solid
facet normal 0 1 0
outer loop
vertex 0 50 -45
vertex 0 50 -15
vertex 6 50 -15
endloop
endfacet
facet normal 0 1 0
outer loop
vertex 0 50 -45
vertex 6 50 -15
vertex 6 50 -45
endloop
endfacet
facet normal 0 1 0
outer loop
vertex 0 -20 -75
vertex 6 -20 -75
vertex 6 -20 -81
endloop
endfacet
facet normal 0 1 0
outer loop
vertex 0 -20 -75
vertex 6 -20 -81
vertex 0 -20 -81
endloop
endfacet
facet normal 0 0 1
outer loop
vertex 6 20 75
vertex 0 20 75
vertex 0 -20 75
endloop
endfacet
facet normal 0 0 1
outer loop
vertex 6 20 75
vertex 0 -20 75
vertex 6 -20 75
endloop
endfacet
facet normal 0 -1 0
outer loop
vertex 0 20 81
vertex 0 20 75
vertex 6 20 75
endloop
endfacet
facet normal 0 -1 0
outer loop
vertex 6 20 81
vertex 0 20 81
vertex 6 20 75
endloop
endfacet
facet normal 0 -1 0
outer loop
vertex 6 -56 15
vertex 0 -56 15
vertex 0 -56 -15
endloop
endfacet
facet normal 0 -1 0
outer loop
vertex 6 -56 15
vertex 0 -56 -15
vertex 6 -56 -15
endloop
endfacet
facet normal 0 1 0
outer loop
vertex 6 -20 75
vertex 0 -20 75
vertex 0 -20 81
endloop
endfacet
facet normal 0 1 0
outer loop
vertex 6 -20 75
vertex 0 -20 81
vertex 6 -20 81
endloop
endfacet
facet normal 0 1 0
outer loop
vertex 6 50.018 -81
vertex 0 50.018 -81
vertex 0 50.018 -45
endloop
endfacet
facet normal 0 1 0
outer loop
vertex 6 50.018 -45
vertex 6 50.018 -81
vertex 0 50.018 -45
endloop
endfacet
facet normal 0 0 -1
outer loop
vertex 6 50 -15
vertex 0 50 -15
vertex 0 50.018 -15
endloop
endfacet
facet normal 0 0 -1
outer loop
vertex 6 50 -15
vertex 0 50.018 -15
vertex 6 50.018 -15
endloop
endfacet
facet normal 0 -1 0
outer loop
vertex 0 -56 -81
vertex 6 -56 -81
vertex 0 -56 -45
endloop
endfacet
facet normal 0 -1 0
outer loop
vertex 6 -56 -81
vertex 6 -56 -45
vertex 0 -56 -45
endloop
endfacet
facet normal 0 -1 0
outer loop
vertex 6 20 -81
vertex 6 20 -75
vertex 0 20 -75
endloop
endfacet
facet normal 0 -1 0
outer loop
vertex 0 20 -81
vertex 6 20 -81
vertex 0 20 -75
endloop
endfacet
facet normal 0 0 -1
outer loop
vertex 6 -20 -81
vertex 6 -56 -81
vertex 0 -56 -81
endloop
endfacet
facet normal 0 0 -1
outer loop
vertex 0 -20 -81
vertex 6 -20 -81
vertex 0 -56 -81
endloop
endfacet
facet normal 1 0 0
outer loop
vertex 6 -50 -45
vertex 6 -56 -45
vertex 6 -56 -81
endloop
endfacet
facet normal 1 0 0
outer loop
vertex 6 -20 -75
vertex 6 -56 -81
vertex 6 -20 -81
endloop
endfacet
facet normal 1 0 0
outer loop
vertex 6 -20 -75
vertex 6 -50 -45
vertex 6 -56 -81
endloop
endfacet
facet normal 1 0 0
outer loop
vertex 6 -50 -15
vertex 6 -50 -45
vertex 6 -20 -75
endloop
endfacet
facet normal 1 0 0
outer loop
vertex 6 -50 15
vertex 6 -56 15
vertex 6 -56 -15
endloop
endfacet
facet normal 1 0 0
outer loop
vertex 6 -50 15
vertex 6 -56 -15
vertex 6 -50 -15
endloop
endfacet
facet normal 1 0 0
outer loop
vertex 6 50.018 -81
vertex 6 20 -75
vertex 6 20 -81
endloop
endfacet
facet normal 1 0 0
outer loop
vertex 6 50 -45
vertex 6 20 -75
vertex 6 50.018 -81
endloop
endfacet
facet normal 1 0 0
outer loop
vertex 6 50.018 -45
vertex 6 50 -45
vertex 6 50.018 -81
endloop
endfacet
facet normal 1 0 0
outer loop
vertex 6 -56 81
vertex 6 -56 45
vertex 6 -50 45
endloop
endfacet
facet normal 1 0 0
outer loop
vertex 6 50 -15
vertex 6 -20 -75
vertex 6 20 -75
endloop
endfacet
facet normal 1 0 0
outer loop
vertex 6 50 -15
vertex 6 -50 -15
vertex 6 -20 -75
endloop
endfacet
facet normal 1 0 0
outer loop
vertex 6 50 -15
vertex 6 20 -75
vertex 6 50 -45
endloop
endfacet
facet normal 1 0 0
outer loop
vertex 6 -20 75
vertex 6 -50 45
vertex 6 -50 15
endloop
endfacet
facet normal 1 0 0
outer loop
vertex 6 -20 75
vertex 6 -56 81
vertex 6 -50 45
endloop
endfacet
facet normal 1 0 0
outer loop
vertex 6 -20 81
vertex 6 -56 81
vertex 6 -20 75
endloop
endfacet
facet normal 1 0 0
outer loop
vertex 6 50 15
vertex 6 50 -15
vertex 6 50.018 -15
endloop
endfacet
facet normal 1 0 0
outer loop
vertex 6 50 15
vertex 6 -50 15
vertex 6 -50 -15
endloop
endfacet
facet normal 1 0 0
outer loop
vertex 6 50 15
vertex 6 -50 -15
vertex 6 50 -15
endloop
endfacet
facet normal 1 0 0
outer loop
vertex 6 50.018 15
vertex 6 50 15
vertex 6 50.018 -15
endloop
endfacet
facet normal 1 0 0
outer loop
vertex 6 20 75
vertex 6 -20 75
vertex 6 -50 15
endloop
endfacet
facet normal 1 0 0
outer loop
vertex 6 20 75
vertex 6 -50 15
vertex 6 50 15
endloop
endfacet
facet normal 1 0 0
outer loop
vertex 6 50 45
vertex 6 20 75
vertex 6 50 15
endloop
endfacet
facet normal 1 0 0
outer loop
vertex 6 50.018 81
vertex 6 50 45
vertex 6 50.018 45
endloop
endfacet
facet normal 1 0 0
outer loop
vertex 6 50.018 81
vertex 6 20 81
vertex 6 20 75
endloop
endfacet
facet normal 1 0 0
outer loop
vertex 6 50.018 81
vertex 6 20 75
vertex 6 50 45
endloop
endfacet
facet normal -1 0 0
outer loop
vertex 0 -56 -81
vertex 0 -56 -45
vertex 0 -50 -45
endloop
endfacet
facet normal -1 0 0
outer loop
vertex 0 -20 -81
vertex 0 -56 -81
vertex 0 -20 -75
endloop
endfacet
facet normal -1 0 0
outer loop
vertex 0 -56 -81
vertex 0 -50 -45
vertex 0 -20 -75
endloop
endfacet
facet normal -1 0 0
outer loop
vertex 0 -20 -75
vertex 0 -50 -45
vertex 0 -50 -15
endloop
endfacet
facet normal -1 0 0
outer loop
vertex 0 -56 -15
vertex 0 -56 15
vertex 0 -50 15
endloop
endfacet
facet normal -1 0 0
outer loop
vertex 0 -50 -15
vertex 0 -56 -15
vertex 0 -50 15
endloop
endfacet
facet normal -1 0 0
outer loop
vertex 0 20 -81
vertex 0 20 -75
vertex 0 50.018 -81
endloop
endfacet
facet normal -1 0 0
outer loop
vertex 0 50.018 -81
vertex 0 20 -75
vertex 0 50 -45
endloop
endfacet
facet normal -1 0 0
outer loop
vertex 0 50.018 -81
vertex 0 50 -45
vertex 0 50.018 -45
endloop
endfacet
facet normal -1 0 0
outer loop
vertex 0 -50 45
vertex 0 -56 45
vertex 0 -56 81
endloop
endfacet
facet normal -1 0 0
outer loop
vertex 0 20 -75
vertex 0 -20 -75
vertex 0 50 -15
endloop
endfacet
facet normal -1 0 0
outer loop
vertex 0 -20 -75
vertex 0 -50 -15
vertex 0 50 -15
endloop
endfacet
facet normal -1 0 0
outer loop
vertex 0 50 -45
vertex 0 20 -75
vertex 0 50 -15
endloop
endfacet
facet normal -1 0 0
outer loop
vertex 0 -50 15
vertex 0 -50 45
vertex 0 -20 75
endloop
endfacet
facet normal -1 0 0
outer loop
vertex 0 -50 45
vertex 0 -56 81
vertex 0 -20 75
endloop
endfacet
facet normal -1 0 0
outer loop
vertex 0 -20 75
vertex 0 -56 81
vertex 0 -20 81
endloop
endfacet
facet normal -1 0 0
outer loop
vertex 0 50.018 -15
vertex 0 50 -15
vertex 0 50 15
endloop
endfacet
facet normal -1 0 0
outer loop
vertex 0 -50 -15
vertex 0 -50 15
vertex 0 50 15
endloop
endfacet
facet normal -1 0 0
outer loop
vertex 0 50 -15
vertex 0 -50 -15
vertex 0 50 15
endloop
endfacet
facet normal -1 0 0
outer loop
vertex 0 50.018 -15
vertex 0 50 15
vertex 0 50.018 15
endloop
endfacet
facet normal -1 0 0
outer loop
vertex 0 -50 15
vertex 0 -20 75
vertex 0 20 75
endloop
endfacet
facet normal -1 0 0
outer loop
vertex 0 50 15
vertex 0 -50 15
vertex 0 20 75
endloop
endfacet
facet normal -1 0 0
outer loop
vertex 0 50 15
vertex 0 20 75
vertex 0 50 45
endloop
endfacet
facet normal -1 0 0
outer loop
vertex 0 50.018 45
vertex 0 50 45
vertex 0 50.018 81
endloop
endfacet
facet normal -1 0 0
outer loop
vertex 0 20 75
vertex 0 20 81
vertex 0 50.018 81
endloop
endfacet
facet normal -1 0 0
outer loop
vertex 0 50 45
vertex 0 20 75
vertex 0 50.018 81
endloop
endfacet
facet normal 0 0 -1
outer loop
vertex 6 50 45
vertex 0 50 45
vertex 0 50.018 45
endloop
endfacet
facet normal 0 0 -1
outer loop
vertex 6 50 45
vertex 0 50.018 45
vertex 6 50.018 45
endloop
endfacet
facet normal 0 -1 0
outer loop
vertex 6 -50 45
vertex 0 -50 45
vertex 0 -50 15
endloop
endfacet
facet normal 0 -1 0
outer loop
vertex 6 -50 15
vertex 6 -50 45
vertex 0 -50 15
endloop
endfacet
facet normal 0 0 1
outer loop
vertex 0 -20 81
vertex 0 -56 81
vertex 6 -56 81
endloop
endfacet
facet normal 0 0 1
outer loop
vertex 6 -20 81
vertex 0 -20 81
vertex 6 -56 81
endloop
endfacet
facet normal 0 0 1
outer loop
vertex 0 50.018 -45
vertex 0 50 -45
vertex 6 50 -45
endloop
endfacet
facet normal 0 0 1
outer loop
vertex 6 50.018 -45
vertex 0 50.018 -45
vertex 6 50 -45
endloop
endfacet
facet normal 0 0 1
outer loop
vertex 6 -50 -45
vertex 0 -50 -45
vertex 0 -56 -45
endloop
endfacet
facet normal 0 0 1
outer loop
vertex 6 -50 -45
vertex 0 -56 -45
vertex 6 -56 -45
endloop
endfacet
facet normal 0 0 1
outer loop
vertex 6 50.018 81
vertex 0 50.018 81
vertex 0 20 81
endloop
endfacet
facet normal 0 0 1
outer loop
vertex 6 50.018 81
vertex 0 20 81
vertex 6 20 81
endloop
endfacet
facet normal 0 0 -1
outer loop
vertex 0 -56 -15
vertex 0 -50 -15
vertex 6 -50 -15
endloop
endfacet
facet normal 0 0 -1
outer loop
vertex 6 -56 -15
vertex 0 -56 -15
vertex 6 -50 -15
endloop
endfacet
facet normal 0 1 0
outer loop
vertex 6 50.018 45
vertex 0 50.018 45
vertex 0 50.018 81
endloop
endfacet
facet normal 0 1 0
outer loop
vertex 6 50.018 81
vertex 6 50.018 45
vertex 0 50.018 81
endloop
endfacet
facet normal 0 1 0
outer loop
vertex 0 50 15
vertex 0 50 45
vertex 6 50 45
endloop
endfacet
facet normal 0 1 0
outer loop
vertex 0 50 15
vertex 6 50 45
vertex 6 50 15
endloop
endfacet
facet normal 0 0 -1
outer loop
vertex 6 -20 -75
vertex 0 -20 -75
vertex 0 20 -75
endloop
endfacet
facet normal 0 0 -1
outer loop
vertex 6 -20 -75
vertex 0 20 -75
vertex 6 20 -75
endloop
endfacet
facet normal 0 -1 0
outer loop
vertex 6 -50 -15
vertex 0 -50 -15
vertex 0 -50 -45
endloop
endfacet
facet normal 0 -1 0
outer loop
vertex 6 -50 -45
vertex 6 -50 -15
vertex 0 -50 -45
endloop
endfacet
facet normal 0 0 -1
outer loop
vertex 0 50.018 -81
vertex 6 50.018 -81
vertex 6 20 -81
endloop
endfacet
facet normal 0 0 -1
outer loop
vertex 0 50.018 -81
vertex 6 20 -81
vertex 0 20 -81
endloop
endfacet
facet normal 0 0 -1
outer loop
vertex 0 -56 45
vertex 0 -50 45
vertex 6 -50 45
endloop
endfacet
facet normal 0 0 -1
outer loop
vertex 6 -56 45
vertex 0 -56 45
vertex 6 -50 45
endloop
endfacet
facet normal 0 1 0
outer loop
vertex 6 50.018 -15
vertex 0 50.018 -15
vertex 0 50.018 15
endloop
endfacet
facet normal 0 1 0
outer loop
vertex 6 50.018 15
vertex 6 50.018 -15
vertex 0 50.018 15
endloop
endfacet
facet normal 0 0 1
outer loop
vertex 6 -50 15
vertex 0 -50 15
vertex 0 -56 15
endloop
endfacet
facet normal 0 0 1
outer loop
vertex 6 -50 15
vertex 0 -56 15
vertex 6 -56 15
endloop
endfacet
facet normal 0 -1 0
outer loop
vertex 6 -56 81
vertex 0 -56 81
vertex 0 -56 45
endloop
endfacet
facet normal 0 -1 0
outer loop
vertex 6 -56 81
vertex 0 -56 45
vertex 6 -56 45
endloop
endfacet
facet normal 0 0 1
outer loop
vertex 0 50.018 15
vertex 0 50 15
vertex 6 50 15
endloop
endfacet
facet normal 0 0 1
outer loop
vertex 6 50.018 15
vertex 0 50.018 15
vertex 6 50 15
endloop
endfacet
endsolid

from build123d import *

# Parameters (mm, degrees)
ESBO_O1_W                = 150
ESBO_O1_H                = 100
RESSALTO_EXTRUS_O1_DEPTH = 6
ESBO_O3_W                = 6
ESBO_O3_H                = 30
RESSALTO_EXTRUS_O2_DEPTH = 6
ESBO_O4_W                = 6
ESBO_O4_H                = 30
RESSALTO_EXTRUS_O3_DEPTH = 6
ESBO_O6_W                = 6
ESBO_O6_H                = 36
RESSALTO_EXTRUS_O4_DEPTH = 6
ESBO_O7_W                = 6
ESBO_O7_H                = 36
RESSALTO_EXTRUS_O5_DEPTH = 6
ESBO_O8_W                = 162
ESBO_O8_H                = 5.982470976
CORTE_EXTRUS_O1_DEPTH    = 6


with BuildPart() as part:
    # Esboço1 → Ressalto-extrusão1 (new body)
    with BuildSketch(Plane(origin=(0, 0, 0), x_dir=(0, 0, -1), z_dir=(1, 0, 0))):
        Rectangle(ESBO_O1_W, ESBO_O1_H)
    extrude(amount=RESSALTO_EXTRUS_O1_DEPTH)

    # Esboço3 → Ressalto-extrusão2 (add)
    with BuildSketch(Plane(origin=(0, 50, 0), x_dir=(1, 0, 0), z_dir=(0, 1, 0))):
        with Locations((3, 60)):
            Rectangle(ESBO_O3_W, ESBO_O3_H)
        with Locations((3, 0)):
            Rectangle(ESBO_O3_W, ESBO_O3_H)
        with Locations((3, -60)):
            Rectangle(ESBO_O3_W, ESBO_O3_H)
    extrude(amount=RESSALTO_EXTRUS_O2_DEPTH)

    # Esboço4 → Ressalto-extrusão3 (add)
    with BuildSketch(Plane.XZ.offset(50)):
        with Locations((3, 60)):
            Rectangle(ESBO_O4_W, ESBO_O4_H)
        with Locations((3, 0)):
            Rectangle(ESBO_O4_W, ESBO_O4_H)
        with Locations((3, -60)):
            Rectangle(ESBO_O4_W, ESBO_O4_H)
    extrude(amount=RESSALTO_EXTRUS_O3_DEPTH)

    # Esboço6 → Ressalto-extrusão4 (add)
    with BuildSketch(Plane.XY.offset(75)):
        with Locations((3, 38)):
            Rectangle(ESBO_O6_W, ESBO_O6_H)
        with Locations((3, -38)):
            Rectangle(ESBO_O6_W, ESBO_O6_H)
    extrude(amount=RESSALTO_EXTRUS_O4_DEPTH)

    # Esboço7 → Ressalto-extrusão5 (add)
    with BuildSketch(Plane(origin=(0, 0, -75), x_dir=(-1, 0, 0), z_dir=(0, 0, -1))):
        with Locations((-3, -38)):
            Rectangle(ESBO_O7_W, ESBO_O7_H)
        with Locations((-3, 38)):
            Rectangle(ESBO_O7_W, ESBO_O7_H)
    extrude(amount=RESSALTO_EXTRUS_O5_DEPTH)

    # Esboço8 → Corte-extrusão1 (cut)
    with BuildSketch(Plane.ZY):
        with Locations((0, 53.008764512)):
            Rectangle(ESBO_O8_W, ESBO_O8_H)
    extrude(amount=-CORTE_EXTRUS_O1_DEPTH, mode=Mode.SUBTRACT)


solid = part.part
